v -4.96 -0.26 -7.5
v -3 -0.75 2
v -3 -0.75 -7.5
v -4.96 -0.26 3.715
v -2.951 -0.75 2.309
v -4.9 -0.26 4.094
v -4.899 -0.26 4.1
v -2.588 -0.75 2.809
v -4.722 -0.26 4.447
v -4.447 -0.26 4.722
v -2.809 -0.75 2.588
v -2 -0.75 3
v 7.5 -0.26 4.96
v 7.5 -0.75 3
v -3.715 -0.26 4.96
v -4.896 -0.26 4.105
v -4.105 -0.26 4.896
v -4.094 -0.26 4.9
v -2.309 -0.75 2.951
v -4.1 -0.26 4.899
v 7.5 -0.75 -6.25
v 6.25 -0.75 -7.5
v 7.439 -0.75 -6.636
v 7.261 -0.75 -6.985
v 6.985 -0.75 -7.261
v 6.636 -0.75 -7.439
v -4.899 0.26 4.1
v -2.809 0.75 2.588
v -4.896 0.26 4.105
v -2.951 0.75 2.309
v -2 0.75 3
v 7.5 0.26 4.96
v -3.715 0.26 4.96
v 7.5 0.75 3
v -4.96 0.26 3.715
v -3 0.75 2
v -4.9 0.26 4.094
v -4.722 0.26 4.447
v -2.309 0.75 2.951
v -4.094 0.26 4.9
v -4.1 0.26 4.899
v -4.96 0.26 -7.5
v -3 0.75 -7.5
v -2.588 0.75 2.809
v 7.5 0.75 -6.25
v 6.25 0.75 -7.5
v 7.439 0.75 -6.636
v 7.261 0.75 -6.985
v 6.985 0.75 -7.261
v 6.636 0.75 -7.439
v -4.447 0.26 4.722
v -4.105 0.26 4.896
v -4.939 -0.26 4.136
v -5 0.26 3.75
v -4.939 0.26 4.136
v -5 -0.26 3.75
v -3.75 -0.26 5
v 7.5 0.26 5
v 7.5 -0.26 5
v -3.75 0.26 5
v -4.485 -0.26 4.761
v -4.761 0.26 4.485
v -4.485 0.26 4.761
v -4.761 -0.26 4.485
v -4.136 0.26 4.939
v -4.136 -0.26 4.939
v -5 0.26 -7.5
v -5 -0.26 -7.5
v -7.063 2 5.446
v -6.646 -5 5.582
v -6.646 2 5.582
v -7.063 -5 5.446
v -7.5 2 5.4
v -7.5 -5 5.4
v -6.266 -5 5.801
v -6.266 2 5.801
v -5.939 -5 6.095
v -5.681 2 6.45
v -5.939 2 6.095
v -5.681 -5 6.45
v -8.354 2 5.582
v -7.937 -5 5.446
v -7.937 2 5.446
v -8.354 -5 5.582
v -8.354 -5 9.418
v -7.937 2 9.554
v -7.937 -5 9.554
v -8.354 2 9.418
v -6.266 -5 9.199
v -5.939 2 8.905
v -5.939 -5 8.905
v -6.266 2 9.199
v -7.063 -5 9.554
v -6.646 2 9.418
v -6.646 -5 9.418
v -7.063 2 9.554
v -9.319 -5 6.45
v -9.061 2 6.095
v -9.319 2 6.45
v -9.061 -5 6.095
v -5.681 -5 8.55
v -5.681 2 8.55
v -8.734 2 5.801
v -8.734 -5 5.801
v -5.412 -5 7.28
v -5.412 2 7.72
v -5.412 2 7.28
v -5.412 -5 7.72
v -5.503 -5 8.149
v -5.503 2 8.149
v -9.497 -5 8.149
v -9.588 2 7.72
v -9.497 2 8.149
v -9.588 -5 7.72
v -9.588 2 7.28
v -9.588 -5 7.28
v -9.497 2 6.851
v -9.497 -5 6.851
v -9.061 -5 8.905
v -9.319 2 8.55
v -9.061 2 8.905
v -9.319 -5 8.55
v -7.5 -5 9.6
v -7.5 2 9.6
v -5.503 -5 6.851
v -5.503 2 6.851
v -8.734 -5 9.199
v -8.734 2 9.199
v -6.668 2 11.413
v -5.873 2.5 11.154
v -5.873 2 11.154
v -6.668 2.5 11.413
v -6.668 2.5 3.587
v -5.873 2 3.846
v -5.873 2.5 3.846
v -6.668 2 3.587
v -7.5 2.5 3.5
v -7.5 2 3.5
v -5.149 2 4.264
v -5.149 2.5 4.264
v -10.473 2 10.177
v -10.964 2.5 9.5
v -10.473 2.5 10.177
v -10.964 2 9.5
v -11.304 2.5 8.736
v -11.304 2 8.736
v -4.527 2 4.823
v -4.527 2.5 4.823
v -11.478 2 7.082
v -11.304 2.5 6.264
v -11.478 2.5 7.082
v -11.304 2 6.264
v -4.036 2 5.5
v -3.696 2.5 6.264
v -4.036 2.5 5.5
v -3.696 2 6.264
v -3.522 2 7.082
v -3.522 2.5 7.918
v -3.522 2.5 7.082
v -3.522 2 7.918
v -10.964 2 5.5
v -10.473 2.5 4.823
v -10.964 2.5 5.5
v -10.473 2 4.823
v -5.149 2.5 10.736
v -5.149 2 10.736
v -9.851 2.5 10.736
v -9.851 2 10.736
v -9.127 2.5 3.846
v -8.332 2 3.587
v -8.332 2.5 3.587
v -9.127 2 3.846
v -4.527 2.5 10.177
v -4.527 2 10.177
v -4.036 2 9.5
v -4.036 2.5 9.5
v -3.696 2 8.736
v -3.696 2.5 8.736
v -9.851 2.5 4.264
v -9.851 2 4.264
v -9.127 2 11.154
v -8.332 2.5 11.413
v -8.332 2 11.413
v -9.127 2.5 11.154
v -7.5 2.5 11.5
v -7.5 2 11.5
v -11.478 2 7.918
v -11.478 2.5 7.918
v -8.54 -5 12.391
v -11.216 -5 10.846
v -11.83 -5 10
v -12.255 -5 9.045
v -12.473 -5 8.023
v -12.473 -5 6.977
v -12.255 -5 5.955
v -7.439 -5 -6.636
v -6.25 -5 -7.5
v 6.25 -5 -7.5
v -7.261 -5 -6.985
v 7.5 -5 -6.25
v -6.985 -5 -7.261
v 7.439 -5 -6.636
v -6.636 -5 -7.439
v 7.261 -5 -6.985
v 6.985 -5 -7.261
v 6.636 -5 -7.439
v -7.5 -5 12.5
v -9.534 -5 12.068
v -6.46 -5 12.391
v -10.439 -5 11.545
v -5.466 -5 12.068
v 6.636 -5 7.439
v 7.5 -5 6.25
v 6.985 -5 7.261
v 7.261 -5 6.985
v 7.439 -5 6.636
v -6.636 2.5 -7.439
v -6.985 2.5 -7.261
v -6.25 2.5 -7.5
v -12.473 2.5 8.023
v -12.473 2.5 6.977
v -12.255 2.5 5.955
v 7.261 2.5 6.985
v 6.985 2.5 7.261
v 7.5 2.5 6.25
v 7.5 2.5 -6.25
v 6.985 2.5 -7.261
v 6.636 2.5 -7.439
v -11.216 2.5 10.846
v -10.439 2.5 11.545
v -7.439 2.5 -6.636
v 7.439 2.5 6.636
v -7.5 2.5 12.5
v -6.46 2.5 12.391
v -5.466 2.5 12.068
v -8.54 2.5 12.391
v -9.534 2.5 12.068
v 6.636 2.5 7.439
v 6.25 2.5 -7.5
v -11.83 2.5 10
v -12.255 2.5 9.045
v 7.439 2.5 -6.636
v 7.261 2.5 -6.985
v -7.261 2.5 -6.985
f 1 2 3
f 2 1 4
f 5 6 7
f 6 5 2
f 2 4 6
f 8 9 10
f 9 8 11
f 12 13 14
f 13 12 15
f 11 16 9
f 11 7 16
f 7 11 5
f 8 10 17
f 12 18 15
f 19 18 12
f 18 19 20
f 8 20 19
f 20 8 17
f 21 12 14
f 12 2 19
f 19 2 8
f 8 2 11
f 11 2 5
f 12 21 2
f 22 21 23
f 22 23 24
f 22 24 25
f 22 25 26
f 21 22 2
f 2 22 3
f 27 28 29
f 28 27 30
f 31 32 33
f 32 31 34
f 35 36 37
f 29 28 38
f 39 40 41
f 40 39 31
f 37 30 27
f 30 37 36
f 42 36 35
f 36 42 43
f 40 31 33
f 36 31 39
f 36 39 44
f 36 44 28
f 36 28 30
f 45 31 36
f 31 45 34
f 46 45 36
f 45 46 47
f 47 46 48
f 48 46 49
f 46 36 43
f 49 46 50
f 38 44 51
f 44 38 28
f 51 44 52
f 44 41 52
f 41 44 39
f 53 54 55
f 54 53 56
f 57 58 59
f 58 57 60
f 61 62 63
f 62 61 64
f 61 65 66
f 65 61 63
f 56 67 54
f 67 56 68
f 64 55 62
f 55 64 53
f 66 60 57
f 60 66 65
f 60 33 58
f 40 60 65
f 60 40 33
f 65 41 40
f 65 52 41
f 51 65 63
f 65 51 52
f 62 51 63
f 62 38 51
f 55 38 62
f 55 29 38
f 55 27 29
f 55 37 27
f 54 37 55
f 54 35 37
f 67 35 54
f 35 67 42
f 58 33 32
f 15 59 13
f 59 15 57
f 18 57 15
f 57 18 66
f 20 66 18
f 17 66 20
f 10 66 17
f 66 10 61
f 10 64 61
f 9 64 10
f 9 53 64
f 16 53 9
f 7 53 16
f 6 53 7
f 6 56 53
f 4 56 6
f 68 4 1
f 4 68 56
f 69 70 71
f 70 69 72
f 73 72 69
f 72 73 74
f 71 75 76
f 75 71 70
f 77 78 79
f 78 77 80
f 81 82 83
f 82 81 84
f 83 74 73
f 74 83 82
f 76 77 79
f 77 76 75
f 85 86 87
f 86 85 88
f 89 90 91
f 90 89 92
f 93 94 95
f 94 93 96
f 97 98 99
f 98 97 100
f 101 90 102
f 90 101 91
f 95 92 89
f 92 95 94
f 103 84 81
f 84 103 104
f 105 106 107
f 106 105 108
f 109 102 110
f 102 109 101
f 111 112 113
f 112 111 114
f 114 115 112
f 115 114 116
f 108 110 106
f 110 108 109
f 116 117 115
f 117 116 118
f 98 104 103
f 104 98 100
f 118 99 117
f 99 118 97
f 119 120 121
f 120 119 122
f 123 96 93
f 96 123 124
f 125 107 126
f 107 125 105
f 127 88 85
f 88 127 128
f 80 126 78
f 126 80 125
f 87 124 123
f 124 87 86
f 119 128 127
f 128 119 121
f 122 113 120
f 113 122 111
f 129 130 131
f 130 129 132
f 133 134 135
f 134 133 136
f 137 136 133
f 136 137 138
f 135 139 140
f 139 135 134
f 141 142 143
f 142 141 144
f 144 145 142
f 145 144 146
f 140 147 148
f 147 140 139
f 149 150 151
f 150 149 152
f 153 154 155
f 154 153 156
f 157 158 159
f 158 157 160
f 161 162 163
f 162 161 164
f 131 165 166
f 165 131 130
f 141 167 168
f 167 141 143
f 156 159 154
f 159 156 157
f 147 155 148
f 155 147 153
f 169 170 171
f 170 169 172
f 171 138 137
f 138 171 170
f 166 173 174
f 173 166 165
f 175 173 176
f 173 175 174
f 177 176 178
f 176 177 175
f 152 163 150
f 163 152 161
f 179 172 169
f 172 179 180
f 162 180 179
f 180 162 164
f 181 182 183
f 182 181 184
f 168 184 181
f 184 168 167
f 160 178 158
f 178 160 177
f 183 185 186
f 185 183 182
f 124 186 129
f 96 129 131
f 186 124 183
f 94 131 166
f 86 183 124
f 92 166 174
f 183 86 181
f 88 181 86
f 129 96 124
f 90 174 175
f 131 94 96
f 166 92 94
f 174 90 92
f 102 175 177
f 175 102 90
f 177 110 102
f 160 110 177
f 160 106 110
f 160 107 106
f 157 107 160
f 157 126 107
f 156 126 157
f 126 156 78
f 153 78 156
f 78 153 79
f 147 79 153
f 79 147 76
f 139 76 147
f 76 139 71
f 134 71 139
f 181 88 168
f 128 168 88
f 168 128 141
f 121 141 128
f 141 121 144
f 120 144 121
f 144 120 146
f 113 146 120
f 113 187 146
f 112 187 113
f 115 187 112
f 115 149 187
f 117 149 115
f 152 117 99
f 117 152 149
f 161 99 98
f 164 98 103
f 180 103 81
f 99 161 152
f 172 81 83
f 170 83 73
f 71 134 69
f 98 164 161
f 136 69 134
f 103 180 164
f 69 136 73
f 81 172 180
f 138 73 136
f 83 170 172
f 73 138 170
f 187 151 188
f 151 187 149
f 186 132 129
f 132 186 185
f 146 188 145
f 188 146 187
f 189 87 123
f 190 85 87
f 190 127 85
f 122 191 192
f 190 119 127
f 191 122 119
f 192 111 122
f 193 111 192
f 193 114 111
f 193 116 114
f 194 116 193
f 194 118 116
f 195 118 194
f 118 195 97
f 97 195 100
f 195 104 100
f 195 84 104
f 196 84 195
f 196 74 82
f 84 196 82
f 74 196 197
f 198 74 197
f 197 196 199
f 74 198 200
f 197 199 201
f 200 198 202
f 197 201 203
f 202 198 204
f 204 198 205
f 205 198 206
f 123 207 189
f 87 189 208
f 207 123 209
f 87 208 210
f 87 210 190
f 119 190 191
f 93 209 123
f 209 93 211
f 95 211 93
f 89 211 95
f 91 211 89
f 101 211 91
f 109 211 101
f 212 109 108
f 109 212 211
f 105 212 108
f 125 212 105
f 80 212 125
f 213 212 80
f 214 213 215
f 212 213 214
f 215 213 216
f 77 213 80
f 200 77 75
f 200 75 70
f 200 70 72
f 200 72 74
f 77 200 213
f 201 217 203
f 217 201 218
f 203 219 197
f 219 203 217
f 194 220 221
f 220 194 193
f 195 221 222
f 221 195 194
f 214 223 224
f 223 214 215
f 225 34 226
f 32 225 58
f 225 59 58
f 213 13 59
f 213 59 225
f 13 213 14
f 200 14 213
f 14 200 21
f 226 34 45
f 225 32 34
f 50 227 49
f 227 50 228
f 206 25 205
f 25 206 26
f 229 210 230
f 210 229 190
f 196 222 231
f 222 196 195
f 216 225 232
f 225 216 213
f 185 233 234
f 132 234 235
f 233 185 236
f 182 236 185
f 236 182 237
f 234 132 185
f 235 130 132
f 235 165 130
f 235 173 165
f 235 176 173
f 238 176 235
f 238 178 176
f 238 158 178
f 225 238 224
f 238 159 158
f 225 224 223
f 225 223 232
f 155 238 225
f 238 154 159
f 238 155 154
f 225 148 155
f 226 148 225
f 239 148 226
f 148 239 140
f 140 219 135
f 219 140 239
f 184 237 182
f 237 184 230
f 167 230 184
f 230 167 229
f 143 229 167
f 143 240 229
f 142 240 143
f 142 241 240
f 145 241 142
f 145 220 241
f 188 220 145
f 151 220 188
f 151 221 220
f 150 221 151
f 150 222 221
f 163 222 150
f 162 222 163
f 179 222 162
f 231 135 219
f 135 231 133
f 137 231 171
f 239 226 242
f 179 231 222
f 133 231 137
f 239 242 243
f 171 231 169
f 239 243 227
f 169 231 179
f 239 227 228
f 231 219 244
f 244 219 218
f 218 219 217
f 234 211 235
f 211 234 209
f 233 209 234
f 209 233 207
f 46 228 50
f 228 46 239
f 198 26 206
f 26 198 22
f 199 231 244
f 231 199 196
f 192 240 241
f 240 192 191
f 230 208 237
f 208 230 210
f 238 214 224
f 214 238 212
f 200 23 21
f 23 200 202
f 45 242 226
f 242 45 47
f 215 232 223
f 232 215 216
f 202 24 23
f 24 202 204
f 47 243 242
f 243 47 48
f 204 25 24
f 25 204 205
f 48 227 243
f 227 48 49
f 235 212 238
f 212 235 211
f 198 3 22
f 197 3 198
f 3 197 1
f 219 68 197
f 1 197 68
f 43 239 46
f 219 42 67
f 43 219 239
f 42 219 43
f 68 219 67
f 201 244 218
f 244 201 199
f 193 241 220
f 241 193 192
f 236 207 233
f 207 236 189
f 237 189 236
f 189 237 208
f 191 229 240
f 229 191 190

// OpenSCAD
/*
 * This circuit board clip takes a range of ~1mm to ~1.75mm thick circuit boards.
 * I use it to hold proto boards which may not have mounting holes or may not have
 * them in convenient place...  In general I print this with 40% infill, 5 perimeters,
 * 5 top solid layers and 5 bottom solid layers using an 0.2mm layer thickness with
 * an 0.4mm nozzle.  I generally use hatchbox PLA filament with a 1st layer temperature
 * of 200C and subsequent layers at 195C.
 *
 * It takes an M4 machine screw.  Four of these can securely mount a board to a base
 * plate or the inside of a project box.  Depending on what filament you use, you may
 * want to scale this either here or in your slicer to compensate for thermal shrinkage.
 */

$fs=0.4;

rotate([90,90,0]) difference() {
    union() {
        hull() {
            translate([-7.5,-7.5, -2.5]) cylinder(r=5, h=5);
            translate([0,0, -2.5]) cylinder(r=5, h=5);
            translate([0,0,-2.5]) linear_extrude(height=7.5) offset(r=1.25) square([12.5, 12.5], center=true);
            translate([-7.5, -7.5]) cylinder(r=5, h=5);
        }
    }
    union() {
        translate([5,5,0]) union() {
            for(i=[0,180])rotate([i,0,0])translate([0,0,0.25]) {
                linear_extrude(height=0.5, scale=0.8) offset(r=1.25) square([17.5,17.5],center=true);
            }
            translate([0,0,-0.26])linear_extrude(height=0.52) offset(r=1.25) square([17.5,17.5],center=true);
        }
        translate([-7.5, -7.5]) cylinder(r=2.1, h=20, center=true);
        translate([-7.5, -7.5, -2.5]) cylinder(r=4, h=1, center=true);
    }
}
